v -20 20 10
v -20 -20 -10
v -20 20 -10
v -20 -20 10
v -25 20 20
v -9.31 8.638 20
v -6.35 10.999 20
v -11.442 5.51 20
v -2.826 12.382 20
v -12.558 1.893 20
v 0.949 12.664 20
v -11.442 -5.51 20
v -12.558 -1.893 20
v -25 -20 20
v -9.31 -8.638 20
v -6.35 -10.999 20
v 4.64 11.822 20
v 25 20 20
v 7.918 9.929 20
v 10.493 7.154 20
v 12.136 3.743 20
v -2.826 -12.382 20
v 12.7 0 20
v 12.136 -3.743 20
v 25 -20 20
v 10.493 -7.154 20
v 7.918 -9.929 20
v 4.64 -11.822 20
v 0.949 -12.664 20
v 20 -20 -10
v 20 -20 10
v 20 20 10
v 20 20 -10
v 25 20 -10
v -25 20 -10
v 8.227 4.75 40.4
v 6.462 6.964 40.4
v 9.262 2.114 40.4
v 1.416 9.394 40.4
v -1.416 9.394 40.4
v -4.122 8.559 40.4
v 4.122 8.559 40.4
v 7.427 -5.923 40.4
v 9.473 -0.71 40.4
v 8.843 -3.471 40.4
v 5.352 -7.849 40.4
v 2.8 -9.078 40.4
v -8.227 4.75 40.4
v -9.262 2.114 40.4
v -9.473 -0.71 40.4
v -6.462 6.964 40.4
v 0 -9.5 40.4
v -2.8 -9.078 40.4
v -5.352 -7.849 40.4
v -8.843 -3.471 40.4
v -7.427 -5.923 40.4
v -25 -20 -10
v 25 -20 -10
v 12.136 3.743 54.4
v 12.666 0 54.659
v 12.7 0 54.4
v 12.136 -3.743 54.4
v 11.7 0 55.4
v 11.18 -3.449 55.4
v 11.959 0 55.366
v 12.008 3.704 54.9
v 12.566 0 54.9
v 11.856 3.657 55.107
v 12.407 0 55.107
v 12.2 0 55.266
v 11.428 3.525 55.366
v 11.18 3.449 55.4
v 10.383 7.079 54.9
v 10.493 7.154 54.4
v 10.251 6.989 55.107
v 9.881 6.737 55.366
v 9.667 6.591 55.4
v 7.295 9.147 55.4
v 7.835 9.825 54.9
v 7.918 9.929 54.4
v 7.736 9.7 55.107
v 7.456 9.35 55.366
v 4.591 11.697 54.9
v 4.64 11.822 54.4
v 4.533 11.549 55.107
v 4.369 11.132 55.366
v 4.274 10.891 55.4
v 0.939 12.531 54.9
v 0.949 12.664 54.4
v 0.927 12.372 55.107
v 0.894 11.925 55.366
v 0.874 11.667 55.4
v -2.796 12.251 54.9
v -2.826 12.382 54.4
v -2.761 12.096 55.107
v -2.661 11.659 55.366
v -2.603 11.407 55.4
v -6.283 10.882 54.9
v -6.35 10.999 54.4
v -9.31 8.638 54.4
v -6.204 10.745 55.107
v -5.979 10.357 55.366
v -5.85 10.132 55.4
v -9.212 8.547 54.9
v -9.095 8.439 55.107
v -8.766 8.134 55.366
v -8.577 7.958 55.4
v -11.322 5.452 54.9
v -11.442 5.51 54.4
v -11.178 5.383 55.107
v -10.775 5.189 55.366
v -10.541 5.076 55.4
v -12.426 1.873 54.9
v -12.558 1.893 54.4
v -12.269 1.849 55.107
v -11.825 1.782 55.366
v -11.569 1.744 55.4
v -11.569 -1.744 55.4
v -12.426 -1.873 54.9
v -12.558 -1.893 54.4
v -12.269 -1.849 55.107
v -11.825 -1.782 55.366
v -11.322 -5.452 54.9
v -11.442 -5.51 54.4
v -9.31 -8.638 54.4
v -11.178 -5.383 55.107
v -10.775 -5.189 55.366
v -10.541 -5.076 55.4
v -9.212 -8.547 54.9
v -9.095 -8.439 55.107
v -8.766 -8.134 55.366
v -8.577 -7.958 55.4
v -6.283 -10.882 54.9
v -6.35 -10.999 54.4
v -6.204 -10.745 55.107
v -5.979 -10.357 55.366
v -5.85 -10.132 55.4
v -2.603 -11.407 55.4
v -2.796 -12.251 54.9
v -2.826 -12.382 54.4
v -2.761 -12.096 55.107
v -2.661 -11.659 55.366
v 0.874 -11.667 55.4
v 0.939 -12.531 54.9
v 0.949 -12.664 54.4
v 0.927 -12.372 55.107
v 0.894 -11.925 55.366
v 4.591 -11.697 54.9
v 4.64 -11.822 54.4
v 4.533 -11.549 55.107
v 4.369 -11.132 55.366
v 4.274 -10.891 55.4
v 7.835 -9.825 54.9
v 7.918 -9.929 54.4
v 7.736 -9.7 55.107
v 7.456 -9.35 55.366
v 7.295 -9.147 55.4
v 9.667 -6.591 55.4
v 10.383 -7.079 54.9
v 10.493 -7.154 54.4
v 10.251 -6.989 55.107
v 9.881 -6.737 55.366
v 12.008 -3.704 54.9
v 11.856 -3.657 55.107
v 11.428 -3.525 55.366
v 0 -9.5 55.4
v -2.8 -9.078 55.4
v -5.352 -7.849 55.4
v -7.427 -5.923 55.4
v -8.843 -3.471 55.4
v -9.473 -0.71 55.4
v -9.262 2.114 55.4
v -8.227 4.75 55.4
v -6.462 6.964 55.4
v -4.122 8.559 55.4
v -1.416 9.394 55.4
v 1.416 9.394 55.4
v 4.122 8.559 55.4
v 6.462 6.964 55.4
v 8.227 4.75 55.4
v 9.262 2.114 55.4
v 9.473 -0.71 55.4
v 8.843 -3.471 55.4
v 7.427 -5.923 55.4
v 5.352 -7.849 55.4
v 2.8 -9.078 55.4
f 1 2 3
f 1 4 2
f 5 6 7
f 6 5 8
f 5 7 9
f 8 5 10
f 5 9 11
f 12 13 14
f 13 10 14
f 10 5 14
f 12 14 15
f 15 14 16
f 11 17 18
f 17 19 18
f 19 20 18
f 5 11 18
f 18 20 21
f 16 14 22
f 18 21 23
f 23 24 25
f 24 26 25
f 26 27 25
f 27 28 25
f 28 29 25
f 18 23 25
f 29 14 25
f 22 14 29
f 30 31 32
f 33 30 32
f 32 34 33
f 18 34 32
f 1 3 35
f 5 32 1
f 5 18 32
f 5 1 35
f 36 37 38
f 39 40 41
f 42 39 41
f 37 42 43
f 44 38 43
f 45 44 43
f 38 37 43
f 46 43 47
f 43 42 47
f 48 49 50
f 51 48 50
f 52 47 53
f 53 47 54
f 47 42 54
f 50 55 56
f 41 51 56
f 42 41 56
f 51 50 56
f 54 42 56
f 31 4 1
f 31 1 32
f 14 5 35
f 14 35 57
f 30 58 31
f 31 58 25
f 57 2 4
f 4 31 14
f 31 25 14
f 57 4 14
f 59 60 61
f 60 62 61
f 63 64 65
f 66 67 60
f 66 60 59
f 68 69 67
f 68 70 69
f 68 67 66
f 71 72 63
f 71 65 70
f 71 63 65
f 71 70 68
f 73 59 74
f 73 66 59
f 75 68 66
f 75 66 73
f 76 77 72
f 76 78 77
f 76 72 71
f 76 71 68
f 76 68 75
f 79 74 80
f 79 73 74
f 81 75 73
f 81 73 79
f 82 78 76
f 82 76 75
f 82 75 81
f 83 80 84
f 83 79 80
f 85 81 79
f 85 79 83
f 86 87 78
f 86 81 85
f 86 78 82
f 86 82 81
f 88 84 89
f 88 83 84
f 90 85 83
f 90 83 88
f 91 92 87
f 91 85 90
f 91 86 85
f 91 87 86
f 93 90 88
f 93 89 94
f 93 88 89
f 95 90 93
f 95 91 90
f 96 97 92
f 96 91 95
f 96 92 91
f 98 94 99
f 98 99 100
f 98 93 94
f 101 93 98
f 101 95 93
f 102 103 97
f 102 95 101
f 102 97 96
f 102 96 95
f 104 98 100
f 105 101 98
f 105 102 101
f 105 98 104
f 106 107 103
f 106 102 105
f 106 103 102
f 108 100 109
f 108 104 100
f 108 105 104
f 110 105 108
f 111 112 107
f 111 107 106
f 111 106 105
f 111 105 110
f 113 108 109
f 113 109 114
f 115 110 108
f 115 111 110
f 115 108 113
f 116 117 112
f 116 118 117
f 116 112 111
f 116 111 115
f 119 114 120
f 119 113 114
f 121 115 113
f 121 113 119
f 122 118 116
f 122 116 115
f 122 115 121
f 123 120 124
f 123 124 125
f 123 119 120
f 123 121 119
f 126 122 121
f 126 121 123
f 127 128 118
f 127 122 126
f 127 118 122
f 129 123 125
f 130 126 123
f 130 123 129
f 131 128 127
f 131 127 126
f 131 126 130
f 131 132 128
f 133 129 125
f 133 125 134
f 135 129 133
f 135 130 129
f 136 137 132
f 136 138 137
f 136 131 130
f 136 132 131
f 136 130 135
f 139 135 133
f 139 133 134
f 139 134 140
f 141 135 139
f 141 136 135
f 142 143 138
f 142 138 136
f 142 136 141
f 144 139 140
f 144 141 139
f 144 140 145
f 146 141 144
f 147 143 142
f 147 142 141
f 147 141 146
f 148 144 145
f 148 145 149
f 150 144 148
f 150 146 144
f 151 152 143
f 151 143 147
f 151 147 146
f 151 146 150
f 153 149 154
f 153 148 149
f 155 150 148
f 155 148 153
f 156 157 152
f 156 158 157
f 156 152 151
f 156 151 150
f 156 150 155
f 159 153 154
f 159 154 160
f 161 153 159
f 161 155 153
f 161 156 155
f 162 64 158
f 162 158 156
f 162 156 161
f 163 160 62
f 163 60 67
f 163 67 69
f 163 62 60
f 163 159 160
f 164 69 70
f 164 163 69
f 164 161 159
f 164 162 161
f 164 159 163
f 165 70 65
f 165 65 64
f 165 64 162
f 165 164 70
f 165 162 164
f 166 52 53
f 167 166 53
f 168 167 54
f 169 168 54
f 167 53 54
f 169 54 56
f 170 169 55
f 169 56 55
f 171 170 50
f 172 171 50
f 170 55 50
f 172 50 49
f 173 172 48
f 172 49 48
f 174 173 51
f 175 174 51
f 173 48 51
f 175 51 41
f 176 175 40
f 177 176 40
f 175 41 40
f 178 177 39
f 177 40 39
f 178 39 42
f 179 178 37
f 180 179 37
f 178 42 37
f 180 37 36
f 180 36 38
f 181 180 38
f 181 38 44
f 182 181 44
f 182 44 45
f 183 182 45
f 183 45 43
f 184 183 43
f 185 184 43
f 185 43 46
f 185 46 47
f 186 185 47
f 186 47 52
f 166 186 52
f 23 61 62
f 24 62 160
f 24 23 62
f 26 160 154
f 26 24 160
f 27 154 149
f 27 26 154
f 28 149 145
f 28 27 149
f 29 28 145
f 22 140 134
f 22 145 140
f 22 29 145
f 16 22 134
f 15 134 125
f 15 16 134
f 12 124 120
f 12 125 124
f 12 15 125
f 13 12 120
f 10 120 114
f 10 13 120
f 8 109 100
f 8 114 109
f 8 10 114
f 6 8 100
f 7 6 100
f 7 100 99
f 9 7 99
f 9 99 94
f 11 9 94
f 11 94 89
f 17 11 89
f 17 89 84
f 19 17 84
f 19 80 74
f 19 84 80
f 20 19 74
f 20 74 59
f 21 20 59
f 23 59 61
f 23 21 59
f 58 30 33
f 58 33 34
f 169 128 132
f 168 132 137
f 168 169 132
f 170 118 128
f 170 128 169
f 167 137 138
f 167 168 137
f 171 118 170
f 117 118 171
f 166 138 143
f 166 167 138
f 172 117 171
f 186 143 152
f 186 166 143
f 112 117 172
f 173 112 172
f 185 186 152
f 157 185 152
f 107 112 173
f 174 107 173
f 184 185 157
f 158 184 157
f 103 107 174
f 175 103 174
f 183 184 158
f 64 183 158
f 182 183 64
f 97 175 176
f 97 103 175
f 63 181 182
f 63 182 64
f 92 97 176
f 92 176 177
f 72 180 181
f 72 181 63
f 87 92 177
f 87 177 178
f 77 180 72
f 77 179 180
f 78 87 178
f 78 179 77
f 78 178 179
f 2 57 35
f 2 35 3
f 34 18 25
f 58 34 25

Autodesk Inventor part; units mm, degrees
ref_plane "YZ Plane" through (0, 0, 0) normal (1, 0, 0) x (0, 1, 0)
ref_plane "XZ Plane" through (0, 0, 0) normal (0, 1, 0) x (-1, 0, 0)
ref_plane "XY Plane" through (0, 0, 0) normal (0, 0, 1) x (1, 0, 0)
sketch "Sketch1" plane through (0, 0, 0) normal (0, 1, 0) x (-1, 0, 0)
  line L0 (20, 0) -> (20, 20)
  line L1 (20, 20) -> (-20, 20)
  line L2 (-20, 20) -> (-20, 0)
  line L3 (20, 10) -> (-20, 10)
  dimension "d49" = 40
extrude "Extrusion1" add sketch "Sketch1" along normal mid plane 40
sketch "Sketch6" plane through (0, 0, 0) normal (0, 0, 1) x (1, 0, 0)
  circle A0 centre (0, 0) radius 12.7
  dimension "d33" = 25.4
extrude "Extrusion6" add sketch "Sketch6" along normal blind 55.4
hole "Hole2" at (0, 0, 55.4) direction (0, 0, -1) diameter 19 depth 15
fillet "Fillet3" radius 1 1 edges at (-12.7, 0, 55.4)
sketch "Sketch8" plane through (0, 0, 0) normal (0, 0, -1) x (-1, 0, 0)
  circle A0 centre (0, 0) radius 13
extrude "Extrusion8" cut sketch "Sketch8" against normal blind 10
sketch "Sketch10" plane through (-20, 20, 20) normal (0, 0, 1) x (1, 0, 0)
  line L0 (0, 0) -> (-5, 0)
  line L1 (-5, 0) -> (-5, -40)
  line L2 (-5, -40) -> (0, -40)
  line L3 (0, -40) -> (0, 0)
  line L4 (40, 0) -> (45, 0)
  line L5 (45, 0) -> (45, -40)
  line L6 (45, -40) -> (40, -40)
  line L7 (40, -40) -> (40, 0)
  point P0 (20, -20)
extrude "Extrusion9" add sketch "Sketch10" against normal blind 30
properties part number "suporte-barra" material "Steel, Carbon"
